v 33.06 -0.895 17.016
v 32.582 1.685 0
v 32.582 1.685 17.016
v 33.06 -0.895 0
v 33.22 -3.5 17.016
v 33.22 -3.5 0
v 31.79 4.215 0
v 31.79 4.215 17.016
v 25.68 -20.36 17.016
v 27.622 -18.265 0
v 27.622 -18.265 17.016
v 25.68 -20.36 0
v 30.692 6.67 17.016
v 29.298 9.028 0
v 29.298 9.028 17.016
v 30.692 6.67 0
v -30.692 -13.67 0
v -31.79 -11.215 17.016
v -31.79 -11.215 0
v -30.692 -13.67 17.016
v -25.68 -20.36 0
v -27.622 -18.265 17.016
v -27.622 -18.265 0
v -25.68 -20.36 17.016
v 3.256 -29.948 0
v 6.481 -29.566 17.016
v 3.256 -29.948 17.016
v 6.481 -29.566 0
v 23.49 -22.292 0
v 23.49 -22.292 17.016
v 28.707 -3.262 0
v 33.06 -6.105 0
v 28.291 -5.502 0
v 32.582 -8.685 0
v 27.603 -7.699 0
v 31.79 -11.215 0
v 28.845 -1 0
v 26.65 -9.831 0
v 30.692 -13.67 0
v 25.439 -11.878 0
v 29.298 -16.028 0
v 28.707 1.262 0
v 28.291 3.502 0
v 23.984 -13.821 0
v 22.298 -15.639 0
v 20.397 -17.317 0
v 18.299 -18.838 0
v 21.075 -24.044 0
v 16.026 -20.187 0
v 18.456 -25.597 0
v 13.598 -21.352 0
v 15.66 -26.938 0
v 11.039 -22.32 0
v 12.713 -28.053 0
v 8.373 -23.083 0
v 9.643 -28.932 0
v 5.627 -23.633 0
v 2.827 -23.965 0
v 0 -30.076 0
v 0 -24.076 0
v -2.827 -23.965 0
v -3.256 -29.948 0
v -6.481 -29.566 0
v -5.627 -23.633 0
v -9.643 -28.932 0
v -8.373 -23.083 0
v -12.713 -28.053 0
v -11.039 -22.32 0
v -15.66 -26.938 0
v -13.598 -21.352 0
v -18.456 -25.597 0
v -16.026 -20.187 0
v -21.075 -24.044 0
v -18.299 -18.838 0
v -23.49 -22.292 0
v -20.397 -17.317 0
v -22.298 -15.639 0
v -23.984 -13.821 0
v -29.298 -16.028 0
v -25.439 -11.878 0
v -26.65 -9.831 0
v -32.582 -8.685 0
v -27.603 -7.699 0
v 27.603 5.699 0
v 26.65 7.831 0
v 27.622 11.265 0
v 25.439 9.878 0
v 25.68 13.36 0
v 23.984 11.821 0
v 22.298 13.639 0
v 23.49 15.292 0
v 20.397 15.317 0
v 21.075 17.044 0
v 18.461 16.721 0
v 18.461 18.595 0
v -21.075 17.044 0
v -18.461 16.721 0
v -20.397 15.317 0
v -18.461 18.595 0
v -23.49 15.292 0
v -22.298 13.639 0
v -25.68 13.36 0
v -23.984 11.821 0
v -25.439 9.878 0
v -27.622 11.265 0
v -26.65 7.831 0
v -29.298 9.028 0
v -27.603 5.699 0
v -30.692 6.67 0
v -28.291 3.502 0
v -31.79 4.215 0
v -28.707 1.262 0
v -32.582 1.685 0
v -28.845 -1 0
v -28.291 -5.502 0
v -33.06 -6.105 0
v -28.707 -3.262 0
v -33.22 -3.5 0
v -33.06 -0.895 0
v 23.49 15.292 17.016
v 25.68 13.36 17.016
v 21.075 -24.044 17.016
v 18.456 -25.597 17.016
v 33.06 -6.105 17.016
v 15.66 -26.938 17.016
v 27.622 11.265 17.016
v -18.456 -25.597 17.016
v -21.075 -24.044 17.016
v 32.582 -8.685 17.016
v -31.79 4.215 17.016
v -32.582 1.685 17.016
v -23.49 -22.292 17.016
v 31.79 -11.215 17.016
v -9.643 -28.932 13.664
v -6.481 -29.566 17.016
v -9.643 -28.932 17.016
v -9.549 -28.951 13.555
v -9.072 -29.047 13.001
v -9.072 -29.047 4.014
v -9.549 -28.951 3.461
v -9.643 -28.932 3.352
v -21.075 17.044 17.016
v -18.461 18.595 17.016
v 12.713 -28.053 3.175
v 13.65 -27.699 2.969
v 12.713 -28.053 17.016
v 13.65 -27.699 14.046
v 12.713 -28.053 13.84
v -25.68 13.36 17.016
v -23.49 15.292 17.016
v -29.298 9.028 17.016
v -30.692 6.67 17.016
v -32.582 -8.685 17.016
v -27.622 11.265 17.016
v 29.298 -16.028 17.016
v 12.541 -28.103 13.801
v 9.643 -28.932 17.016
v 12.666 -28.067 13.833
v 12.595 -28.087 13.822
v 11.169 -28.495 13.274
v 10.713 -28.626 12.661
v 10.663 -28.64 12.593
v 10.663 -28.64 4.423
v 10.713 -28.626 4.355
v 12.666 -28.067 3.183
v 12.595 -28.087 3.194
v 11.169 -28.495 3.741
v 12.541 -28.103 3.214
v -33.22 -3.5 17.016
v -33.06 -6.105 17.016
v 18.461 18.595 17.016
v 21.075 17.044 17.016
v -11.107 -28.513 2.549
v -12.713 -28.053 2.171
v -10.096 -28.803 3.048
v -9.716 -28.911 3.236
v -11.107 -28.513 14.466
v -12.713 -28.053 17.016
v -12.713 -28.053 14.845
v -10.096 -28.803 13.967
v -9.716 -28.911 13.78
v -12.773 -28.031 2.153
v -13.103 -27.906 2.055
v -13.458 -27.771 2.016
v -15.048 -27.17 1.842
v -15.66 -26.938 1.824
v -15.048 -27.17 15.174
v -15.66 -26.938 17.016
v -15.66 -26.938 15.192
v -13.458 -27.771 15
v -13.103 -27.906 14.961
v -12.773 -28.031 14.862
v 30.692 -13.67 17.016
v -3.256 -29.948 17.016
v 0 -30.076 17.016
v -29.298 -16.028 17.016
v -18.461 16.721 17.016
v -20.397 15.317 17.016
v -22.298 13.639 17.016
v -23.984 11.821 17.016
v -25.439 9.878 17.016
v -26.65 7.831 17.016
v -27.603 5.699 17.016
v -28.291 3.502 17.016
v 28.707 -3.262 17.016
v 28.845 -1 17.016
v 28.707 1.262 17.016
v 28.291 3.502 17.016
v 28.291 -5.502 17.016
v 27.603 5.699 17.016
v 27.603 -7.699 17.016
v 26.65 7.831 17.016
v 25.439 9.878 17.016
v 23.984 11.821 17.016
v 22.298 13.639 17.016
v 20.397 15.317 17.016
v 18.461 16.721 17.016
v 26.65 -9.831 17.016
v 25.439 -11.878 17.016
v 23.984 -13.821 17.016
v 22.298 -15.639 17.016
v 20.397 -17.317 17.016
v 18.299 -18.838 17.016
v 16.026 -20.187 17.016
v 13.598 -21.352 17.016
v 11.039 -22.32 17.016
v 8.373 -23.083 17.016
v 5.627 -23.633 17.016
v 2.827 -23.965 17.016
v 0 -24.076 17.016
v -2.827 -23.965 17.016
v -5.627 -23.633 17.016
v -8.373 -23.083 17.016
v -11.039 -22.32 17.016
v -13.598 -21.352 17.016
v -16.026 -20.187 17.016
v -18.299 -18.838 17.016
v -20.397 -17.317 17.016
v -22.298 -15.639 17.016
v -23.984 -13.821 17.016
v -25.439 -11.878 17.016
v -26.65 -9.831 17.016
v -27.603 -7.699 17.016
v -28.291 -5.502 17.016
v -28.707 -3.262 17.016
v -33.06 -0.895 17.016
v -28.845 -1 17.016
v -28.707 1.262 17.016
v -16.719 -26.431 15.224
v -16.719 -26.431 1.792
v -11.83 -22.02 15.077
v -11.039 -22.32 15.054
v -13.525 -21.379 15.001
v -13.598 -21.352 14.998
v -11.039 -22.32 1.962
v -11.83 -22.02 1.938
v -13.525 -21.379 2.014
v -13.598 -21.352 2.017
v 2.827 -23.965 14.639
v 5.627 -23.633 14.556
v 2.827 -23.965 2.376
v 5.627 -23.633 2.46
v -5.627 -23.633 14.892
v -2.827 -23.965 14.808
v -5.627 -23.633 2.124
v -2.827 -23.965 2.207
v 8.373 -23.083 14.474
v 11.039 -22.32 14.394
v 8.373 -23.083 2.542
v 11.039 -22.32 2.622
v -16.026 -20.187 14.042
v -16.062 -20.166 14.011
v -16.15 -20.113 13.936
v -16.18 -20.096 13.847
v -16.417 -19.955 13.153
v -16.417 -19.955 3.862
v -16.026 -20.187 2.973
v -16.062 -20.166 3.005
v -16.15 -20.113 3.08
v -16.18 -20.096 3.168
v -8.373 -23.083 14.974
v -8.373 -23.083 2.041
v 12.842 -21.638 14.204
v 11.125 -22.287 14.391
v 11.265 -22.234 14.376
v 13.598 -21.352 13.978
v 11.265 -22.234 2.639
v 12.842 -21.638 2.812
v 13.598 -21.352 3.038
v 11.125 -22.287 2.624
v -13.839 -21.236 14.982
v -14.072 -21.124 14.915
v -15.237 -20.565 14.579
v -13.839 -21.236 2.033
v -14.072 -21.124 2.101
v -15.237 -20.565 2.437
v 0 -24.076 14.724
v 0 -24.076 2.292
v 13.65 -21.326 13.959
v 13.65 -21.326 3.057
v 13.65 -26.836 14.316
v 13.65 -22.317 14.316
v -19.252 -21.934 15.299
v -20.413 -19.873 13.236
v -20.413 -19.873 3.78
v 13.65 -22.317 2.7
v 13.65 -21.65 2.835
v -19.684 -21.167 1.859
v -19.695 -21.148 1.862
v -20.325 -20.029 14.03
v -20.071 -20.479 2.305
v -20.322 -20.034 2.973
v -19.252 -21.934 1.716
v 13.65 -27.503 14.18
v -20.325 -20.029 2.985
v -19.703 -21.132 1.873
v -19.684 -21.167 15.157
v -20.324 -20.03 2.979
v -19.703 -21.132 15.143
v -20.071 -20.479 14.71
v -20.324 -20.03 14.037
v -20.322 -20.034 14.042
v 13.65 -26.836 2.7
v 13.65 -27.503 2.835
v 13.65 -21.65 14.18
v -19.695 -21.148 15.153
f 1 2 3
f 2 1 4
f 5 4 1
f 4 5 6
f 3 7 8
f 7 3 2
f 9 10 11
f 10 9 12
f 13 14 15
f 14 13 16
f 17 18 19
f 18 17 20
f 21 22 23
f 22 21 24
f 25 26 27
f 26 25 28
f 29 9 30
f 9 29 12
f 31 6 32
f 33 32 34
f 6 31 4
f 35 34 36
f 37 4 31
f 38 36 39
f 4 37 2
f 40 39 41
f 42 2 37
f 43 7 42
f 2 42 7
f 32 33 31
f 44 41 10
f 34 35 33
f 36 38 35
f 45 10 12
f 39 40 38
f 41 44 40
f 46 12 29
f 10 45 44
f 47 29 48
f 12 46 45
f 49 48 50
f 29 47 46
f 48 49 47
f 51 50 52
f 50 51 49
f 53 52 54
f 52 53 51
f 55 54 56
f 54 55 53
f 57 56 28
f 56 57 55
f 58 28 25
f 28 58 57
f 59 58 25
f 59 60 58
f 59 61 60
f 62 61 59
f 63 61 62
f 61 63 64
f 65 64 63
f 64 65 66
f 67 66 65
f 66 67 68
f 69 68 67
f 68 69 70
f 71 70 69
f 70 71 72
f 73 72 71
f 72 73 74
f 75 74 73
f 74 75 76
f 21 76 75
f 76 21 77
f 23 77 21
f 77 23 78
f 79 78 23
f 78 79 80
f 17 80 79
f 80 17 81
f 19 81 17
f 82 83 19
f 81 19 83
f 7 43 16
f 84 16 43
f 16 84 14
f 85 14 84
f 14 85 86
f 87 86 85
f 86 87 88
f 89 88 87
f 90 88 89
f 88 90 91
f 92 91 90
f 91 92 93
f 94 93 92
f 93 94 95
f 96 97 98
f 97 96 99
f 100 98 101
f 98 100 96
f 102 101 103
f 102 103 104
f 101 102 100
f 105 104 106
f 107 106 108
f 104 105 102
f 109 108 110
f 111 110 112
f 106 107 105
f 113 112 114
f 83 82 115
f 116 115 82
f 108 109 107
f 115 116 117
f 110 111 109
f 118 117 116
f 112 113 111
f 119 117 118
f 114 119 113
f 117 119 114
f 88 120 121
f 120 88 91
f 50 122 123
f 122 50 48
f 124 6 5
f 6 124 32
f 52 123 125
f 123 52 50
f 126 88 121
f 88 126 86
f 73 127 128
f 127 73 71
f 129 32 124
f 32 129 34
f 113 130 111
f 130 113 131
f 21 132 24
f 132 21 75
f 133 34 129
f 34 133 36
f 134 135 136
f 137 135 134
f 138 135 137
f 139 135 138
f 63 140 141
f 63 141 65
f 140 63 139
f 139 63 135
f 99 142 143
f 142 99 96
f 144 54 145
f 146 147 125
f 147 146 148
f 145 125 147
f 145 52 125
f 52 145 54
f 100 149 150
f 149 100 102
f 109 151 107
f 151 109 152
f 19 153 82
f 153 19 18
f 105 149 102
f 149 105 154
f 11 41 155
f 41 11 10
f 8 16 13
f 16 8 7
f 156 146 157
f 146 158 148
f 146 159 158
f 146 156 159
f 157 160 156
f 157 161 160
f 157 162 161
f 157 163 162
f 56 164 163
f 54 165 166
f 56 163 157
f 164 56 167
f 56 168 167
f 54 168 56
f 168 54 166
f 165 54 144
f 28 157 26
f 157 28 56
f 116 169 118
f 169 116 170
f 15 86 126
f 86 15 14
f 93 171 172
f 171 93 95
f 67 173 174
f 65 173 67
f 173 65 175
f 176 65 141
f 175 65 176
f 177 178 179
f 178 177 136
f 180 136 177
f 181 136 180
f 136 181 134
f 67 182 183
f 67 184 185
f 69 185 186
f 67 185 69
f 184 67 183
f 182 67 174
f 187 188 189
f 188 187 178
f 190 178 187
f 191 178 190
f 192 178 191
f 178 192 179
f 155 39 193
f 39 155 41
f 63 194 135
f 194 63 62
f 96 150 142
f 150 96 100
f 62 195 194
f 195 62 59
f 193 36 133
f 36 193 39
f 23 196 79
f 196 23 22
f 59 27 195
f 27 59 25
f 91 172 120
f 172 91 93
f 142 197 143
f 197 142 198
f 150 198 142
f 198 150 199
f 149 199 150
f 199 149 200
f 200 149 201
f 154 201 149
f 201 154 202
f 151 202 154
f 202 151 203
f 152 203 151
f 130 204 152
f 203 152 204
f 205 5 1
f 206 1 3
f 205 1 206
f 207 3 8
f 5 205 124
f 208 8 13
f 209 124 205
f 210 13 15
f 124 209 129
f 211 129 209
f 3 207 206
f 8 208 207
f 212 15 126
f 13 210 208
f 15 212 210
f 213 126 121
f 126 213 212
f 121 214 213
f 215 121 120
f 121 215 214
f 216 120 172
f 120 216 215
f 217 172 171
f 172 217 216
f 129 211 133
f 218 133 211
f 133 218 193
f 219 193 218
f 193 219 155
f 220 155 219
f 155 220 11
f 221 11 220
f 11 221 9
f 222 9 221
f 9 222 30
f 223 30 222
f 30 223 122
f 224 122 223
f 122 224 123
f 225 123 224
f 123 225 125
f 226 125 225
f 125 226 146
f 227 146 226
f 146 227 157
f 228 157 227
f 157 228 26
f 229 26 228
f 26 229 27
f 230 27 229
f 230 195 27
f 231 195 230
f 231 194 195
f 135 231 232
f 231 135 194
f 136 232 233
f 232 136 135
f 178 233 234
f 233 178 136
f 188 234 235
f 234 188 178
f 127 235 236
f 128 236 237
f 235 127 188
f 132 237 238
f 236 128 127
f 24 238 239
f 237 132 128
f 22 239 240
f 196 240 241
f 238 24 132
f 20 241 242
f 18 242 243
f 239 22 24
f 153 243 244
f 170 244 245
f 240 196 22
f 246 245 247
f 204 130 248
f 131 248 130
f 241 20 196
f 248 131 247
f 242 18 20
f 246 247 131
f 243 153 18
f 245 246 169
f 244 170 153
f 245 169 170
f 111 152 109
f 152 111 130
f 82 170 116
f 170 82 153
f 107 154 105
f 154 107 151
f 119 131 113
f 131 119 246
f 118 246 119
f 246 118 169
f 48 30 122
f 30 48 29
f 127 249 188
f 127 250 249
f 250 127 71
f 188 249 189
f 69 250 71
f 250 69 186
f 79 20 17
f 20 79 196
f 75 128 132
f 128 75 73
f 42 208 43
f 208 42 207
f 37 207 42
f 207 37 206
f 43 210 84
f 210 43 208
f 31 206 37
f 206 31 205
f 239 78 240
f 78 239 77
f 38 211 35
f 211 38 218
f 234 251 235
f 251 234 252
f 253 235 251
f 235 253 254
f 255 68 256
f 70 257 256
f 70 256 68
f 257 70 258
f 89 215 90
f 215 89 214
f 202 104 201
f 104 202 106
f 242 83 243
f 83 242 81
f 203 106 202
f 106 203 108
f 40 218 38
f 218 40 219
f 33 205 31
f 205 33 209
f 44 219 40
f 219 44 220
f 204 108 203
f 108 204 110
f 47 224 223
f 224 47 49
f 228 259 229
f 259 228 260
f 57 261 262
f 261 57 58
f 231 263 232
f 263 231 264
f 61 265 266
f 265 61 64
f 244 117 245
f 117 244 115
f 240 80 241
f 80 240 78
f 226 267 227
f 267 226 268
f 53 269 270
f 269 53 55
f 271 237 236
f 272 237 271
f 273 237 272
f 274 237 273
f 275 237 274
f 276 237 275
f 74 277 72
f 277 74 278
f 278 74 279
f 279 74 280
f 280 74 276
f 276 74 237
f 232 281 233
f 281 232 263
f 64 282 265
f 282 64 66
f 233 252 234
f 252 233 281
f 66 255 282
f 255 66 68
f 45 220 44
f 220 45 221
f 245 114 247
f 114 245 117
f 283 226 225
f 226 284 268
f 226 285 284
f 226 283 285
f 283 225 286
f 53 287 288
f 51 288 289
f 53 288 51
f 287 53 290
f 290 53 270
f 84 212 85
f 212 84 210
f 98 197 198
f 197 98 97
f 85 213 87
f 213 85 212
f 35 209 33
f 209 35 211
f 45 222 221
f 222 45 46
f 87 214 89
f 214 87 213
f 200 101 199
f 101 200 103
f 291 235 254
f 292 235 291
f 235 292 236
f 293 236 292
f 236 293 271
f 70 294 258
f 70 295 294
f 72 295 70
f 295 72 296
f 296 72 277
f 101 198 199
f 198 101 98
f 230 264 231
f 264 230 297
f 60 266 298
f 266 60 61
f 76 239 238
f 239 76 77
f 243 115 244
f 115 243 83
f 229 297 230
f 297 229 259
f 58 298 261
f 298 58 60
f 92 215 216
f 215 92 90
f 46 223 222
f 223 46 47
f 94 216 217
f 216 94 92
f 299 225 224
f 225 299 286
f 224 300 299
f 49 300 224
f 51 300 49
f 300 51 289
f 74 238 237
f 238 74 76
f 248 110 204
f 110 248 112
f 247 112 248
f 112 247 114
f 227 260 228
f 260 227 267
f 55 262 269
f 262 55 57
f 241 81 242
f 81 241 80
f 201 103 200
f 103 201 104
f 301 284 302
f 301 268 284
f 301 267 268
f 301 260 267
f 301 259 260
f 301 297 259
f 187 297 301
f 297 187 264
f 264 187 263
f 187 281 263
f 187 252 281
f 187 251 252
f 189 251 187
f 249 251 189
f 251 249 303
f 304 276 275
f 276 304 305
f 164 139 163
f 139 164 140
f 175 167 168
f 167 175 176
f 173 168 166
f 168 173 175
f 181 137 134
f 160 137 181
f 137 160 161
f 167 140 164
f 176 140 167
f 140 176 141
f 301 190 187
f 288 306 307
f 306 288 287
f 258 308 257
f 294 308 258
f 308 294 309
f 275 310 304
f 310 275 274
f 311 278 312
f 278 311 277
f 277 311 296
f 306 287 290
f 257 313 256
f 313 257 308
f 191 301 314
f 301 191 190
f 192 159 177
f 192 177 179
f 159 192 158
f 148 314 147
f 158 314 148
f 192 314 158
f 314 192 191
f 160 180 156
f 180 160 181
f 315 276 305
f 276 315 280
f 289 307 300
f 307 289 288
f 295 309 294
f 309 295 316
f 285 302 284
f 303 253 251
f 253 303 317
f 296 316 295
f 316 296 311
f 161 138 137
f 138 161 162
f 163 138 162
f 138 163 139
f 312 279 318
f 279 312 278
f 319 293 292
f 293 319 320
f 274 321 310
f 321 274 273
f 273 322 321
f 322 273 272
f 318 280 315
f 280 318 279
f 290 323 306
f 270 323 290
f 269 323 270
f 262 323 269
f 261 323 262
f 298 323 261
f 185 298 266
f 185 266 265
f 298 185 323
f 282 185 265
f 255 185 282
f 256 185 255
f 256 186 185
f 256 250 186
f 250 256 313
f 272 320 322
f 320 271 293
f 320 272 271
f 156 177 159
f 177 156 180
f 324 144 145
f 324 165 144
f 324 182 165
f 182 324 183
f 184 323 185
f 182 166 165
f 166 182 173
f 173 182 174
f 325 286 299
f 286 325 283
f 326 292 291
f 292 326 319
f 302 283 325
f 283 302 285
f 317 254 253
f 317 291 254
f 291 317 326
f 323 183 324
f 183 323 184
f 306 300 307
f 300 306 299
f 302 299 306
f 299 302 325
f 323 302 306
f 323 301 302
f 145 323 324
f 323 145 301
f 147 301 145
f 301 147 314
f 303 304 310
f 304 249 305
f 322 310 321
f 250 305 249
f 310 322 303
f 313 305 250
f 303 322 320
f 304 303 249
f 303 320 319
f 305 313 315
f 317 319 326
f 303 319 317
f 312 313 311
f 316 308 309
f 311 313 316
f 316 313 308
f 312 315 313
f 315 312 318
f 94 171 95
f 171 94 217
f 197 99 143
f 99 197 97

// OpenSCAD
// Replacement band for Fitbit Flex.
//
// http://www.thingiverse.com/thing:205148
//
// (c) 2013,2014 Laird Popkin.

/* [Settings] */

// Measurement around wrist (mm).
wristLenMM = 0;
// and in inches
wristLenIn = 6.5;
// Part to view
part = 4; //[5: Preview, 4:Band]

// . 0:Assembled Flex (don't print), 1:Flex Band, 2:Flex Box Bottom, 3:Flex Box Top]

/* [Solid Band] */

// Ratio of wrist width to height. 1.0 = circular, 1.25 is normal.
stretch = 1.25;
// Fraction of wrist size to leave open. 1.0 is very loose, 0.8 is tight.
bandOpenRatio = 0.8;
// Band thickness (mm)
bandThick=7;
// Band 'wall' thickness (mm)
bandWall = 2;
// Generate support in model
support=0; //[0:Don't include support, 1:Include support]
// Flex adjust in/out. Positive moves towards the outside, negative moves to inside. Adjust if needed to have the Flex intersect the band as you like.
flexTweakR = 1.5;
// Flex adjust up/down. Positive moves towards the end with the lights, negative moves the other way.
flexTweakX = 0;
// Clearance around Fitbit in band, adjust for your printer. 0=none, .25=loose
clearance=.25;
clearanceFactor=clearance/10;

/* [Hidden] */

wristLength = wristLenMM + wristLenIn*24.5;
// Length of links
linkLen = 13; // [11:Tight, 12:Tight-ish, 13:Loose-ish, 14:Loose]

/* [Hidden] */
$fn=16;
linkHeight=7;
pi=3.14159; // I could go on...
wristLen = wristLength + linkHeight*3.14159; // diameter of outside of band to allow for thickness
in=24.5;
len = 1.4*in;
width=8.5/16*in;
height=3/8*in;
echo(len,width,height);
r=2;
xoff=width/2-r;
yoff=height/2-r;
thick=.5;

flexScale=1.3;
flexLScale=1.105;

blockH=10;
angle=30; // angle of face
zoff = sin(30)*5;

outerWidth=width+4.6*thick;
outerLen = len-3;
outerHeight = height+thick;

hinge_dia = outerHeight * 1000;

hingeXscale = .8;
hingeXoff=0.7;

echo("wrist band length ",wristLen);

flexAngle = 88.7; //89.2;

numLinks = floor((wristLen-outerLen-outerWidth/2)/(linkLen*2));
linksLen = numLinks*linkLen;
echo("links ",numLinks," length ",linksLen);

gap = 0.8;

echo("size ",outerWidth,outerLen,outerHeight);

module flex() {
	translate([0,0,-1]) difference() {
		translate([0,0,-zoff]) linear_extrude(scale=0.85,height=len) {
			square([width-2*r,height],center=true);
			square([width,height-2*r],center=true);

			translate([-xoff,-yoff,0]) circle(r=r);
			translate([-xoff,yoff,0]) circle(r=r);
			translate([xoff,-yoff,0]) circle(r=r);
			translate([xoff,yoff,0]) circle(r=r);
			}
		translate([0,0,-zoff]) rotate([30,0,0]) cube([2*width,2*height,5],center=true);
		}
	}

module male() {
	scale([1,1/2,1]) {
		translate([-outerWidth/8,0,0])
			cube([outerWidth/4,outerWidth/2,linkHeight]);
		translate([0,-gap,0]) cylinder(r=outerWidth/4, h=linkHeight);
		}
	}

module female() {
	scale([1,1/2,1]) difference() {
		translate([-outerWidth/2,-outerWidth/2-gap,0]) 
			cube([outerWidth,outerWidth,linkHeight]);
		translate([-outerWidth/8-gap,0,-1]) 
			cube([outerWidth/4+2*gap,outerWidth/2,linkHeight+2]);
		translate([0,0,-1]) cylinder(r=outerWidth/4+2*gap, h=linkHeight+2);
		}
	}

module FitBitBand(band=1) {
	//#translate([	outerWidth,0,0]) cube([1,wristLen,1],center=true);

	difference() {
		union() {
			// hull around Flex
			translate([0,len/2-zoff,height/2])
				rotate([flexAngle,0,0])
					scale([flexScale,flexScale,flexLScale]) flex();
			// Make 'head' thicker
			translate([0,outerLen*.43,height/2+thick/2]) cube([outerWidth,outerLen*.25,outerHeight],center=true); // around flex
			//block in middle of 'face'
			translate([0,-4,height/2+thick/2+outerHeight/4]) cube([outerWidth,outerLen*.2,outerHeight/2],center=true); // around flex
			//Make sides thicker
			translate([0,-4,height/2+thick/2])
				cube([outerWidth,outerLen,height-2*r],center=true); // around flex
			// links on both sides
			if (band) translate([0,0,outerHeight-linkHeight]) {
				for (link = [0:numLinks-1]) {
					assign (y=link*linkLen) {
//				for (y=[0:linkLen:wristLen/4+outerWidth/4]) {
					translate([hingeXoff,outerLen/2+y+linkLen/2,0]) scale([hingeXscale,1,1]) demo(linkHeight,gap/hingeXscale);
					translate([hingeXoff,-(outerLen/2+y+linkLen/2)-2,0]) scale([hingeXscale,1,1]) demo(linkHeight,gap/hingeXscale);
					}
				translate([0,-wristLen/2,0]) male();
				translate([0,wristLen/2,0]) female();
				}
				}
			}
		// carve out space for Flex
		translate([0,len/2-zoff-1,height/2]) rotate([flexAngle,0,0]) flex();
		// carve out hole on top to put Flex in
		translate([0,1,0]) cube([width,len-7,2*(r)],center=true);
		// carve out gap for pulling Flex out
		translate([0,len/2,.2]) cube([width*.75,6,2*(r+thick)], center=true);
		}

//	translate([hingeXoff,outerLen+1,0]) scale([hingeXscale,1,1]) demo(outerHeight,0.4/hingeXscale);
//	translate([hingeXoff,-outerLen-1,0]) scale([hingeXscale,1,1]) demo(outerHeight,0.4/hingeXscale);
//	translate([hingeXoff,1.75*outerLen+1,0]) scale([hingeXscale,1,1]) demo(outerHeight,0.4/hingeXscale);
//	translate([hingeXoff,-1.75*outerLen-1,0]) scale([hingeXscale,1,1]) demo(outerHeight,0.4/hingeXscale);
	//translate([hingeXoff,2.5*outerLen+1,0]) scale([hingeXscale,1,1]) demo(outerHeight,0.4/hingeXscale);
	//translate([hingeXoff,-2.5*outerLen-1,0]) scale([hingeXscale,1,1]) demo(outerHeight,0.4/hingeXscale);

	// fill gaps between ends and links
	if (band) translate([0,0,linkHeight*.9]) difference() {
		cube([outerWidth,wristLen-outerWidth/2,linkHeight],center=true);
		cube([outerWidth/.9,outerLen+2*linksLen,linkHeight+2],center=true);
		echo("gap len ",((wristLen-outerWidth/2) - (outerLen+2*linksLen))/2);
		}
	}

//flex();

module band() {
fitBitBand(0);
difference() {
	translate([0,0,outerHeight]) rotate([180,0,90]) FitBitBand();
	translate([0,0,-1]) cube([wristLen+10,outerWidth,2],center=true);
	if (part==0) rotate([90,0,0]) translate([0,0,4]) cube([wristLen+10,2*outerWidth,10],center=true);
	}
}

bandH = width+2*bandWall;

module solidBand(preview=0) {
	wristR = wristLen/pi/2/stretch;
	wristW = wristR+bandThick;
	echo ("wrist len ",wristLen," wrist R ",wristR);
	color("red") {
		difference() {
			scale([stretch,1,1]) difference() {
				translate([0,-bandThick/2,0]) 
					cylinder(r=wristR+bandThick/2, h=bandH, $fn=64);
				translate([0,-1,-1]) 
					cylinder(r=wristR, h=bandH+2, $fn=64);
				}
			difference() {
				translate([-len/2-flexTweakX,-wristR-flexTweakR,width/2+bandWall]) 
					rotate([0,-90,180]) 
						scale([1+2*clearanceFactor,
							1+clearanceFactor,
							1+0*clearanceFactor]) 
						flex();
				if (support) //for (xo=[-len/5:len/2.5:len/5]) {
					translate([0,-wristR-bandThick,0]) 
						cube([0.4,bandThick+2,width+2*r]); // loop
					//}
				}
			translate([-wristR*bandOpenRatio,0,-1]) 
				cube([2*wristR*bandOpenRatio, (wristR+bandThick),width+2*bandWall+2]);
			}
		}
		if (preview)
			translate([-len/2-flexTweakX,-wristR-flexTweakR,width/2+bandWall]) 
				rotate([0,-90,180])
					color("black") flex();

	}

module boxBottom() {
	margin = 3;
	bw = outerWidth + 2*margin;
	bl = wristLen+10 + 2*margin;
	wall = 1;

	difference() {
		translate([0,0,outerHeight/2-wall-margin]) cube([bl,bw,outerHeight],center=true);
		translate([0,0,outerHeight/2-margin]) cube([bl-2*wall,bw-2*wall,outerHeight-wall],center=true);
		if (part==0) rotate([90,0,0]) translate([0,0,9]) cube([wristLen+20,3*outerWidth,20],center=true);
		}
	}

module boxTop() {
	margin = 3;
	wall = 1;
	bw = outerWidth + 2*margin + 3*wall;
	bl = wristLen+10 + 2*margin + 3*wall;

	difference() {
		translate([0,0,outerHeight/2+wall+margin]) cube([bl,bw,outerHeight],center=true);
		translate([0,0,outerHeight/2+margin]) cube([bl-2*wall,bw-2*wall,outerHeight-wall],center=true);
		if (part==0) rotate([90,0,0]) translate([0,0,9]) cube([wristLen+20,3*outerWidth,20],center=true);
		}
	}

if ((part==0)||(part==1)) band();
if ((part==0)||(part==2)) boxBottom();
if ((part==0)||(part==3)) boxTop();
if (part==4) solidBand(0);
if (part==5) rotate([-90,0,0]) solidBand(1);

//male();
//female();

/// HINGE

// What diameter or thickness should the hinge have (in 0.01 mm units)?
//hinge_dia = 500; // [1:5000]

// How much gap should be left between separate parts (in 0.01 mm units)?
//hinge_gap = 40; // [1:2000]

module hingepair() {
	union() {
		cylinder(h=0.25, r=0.5);
		translate([0,0,0.25]) cylinder(h=0.25, r1=0.5, r2=0.25);
		translate([0,0,1]) cylinder(h=0.25, r1=0.25, r2=0.5);
		translate([0,0,1.25]) cylinder(h=0.25, r=0.5);
	}
}

module hingecore(gap) {
	union() {
		difference() {
			union() {
				cylinder(h=1.5, r=0.5);
				translate([-0.5,0,0.25+gap])
					cube(size=[1,1,1-gap-gap]);
				//translate([0,-0.5,0.25+gap])
				//	cube(size=[0.5,0.5,1-gap-gap]);
			}
			translate([0,0,0.25+gap-0.5]) cylinder(h=0.75, r1=1, r2=0.25);
			translate([0,0,1-gap]) cylinder(h=0.75, r1=0.25, r2=1);
		}
		translate([-0.5,0.5+gap,0])
			cube(size=[1,0.5-gap,1.5]);
	}
}

module hingeedge(gap) {
	union() {
		hingepair();
		translate([-0.5,-1,0])
			cube(size=[1,0.5-gap,1.5]);
		translate([-0.5,-1,0])
			cube(size=[1,1,0.25]);
		translate([-0.5,-1,1.25])
			cube(size=[1,1,0.25]);
		//translate([0,0,1.25])
		//	cube(size=[0.5,0.5,0.25]);
		//translate([0,0,0])
			//cube(size=[0.5,0.5,0.25]);
	}
}

module hinge(thick, realgap) {
	hingeedge(realgap / thick);
	hingecore(realgap / thick);
}

module demo(t, rg) { // modified to make only two hinges
	scale([t,t,t])
	translate([-2.75,0,0.5])
	rotate(a=[0,90,0])
	union() {
		//hinge(t, rg);
		translate([0,0,1.25]) hinge(t, rg);
		translate([0,0,2.5]) hinge(t, rg);
		//translate([0,0,3.75]) hinge(t, rg);
		//translate([-.5,1,1.25]) cube(size=[1,1,5.25/2+.1]);
		//translate([-0.5,-2,1.25]) cube(size=[1,1,5.25/2+.1]);
	}
}
